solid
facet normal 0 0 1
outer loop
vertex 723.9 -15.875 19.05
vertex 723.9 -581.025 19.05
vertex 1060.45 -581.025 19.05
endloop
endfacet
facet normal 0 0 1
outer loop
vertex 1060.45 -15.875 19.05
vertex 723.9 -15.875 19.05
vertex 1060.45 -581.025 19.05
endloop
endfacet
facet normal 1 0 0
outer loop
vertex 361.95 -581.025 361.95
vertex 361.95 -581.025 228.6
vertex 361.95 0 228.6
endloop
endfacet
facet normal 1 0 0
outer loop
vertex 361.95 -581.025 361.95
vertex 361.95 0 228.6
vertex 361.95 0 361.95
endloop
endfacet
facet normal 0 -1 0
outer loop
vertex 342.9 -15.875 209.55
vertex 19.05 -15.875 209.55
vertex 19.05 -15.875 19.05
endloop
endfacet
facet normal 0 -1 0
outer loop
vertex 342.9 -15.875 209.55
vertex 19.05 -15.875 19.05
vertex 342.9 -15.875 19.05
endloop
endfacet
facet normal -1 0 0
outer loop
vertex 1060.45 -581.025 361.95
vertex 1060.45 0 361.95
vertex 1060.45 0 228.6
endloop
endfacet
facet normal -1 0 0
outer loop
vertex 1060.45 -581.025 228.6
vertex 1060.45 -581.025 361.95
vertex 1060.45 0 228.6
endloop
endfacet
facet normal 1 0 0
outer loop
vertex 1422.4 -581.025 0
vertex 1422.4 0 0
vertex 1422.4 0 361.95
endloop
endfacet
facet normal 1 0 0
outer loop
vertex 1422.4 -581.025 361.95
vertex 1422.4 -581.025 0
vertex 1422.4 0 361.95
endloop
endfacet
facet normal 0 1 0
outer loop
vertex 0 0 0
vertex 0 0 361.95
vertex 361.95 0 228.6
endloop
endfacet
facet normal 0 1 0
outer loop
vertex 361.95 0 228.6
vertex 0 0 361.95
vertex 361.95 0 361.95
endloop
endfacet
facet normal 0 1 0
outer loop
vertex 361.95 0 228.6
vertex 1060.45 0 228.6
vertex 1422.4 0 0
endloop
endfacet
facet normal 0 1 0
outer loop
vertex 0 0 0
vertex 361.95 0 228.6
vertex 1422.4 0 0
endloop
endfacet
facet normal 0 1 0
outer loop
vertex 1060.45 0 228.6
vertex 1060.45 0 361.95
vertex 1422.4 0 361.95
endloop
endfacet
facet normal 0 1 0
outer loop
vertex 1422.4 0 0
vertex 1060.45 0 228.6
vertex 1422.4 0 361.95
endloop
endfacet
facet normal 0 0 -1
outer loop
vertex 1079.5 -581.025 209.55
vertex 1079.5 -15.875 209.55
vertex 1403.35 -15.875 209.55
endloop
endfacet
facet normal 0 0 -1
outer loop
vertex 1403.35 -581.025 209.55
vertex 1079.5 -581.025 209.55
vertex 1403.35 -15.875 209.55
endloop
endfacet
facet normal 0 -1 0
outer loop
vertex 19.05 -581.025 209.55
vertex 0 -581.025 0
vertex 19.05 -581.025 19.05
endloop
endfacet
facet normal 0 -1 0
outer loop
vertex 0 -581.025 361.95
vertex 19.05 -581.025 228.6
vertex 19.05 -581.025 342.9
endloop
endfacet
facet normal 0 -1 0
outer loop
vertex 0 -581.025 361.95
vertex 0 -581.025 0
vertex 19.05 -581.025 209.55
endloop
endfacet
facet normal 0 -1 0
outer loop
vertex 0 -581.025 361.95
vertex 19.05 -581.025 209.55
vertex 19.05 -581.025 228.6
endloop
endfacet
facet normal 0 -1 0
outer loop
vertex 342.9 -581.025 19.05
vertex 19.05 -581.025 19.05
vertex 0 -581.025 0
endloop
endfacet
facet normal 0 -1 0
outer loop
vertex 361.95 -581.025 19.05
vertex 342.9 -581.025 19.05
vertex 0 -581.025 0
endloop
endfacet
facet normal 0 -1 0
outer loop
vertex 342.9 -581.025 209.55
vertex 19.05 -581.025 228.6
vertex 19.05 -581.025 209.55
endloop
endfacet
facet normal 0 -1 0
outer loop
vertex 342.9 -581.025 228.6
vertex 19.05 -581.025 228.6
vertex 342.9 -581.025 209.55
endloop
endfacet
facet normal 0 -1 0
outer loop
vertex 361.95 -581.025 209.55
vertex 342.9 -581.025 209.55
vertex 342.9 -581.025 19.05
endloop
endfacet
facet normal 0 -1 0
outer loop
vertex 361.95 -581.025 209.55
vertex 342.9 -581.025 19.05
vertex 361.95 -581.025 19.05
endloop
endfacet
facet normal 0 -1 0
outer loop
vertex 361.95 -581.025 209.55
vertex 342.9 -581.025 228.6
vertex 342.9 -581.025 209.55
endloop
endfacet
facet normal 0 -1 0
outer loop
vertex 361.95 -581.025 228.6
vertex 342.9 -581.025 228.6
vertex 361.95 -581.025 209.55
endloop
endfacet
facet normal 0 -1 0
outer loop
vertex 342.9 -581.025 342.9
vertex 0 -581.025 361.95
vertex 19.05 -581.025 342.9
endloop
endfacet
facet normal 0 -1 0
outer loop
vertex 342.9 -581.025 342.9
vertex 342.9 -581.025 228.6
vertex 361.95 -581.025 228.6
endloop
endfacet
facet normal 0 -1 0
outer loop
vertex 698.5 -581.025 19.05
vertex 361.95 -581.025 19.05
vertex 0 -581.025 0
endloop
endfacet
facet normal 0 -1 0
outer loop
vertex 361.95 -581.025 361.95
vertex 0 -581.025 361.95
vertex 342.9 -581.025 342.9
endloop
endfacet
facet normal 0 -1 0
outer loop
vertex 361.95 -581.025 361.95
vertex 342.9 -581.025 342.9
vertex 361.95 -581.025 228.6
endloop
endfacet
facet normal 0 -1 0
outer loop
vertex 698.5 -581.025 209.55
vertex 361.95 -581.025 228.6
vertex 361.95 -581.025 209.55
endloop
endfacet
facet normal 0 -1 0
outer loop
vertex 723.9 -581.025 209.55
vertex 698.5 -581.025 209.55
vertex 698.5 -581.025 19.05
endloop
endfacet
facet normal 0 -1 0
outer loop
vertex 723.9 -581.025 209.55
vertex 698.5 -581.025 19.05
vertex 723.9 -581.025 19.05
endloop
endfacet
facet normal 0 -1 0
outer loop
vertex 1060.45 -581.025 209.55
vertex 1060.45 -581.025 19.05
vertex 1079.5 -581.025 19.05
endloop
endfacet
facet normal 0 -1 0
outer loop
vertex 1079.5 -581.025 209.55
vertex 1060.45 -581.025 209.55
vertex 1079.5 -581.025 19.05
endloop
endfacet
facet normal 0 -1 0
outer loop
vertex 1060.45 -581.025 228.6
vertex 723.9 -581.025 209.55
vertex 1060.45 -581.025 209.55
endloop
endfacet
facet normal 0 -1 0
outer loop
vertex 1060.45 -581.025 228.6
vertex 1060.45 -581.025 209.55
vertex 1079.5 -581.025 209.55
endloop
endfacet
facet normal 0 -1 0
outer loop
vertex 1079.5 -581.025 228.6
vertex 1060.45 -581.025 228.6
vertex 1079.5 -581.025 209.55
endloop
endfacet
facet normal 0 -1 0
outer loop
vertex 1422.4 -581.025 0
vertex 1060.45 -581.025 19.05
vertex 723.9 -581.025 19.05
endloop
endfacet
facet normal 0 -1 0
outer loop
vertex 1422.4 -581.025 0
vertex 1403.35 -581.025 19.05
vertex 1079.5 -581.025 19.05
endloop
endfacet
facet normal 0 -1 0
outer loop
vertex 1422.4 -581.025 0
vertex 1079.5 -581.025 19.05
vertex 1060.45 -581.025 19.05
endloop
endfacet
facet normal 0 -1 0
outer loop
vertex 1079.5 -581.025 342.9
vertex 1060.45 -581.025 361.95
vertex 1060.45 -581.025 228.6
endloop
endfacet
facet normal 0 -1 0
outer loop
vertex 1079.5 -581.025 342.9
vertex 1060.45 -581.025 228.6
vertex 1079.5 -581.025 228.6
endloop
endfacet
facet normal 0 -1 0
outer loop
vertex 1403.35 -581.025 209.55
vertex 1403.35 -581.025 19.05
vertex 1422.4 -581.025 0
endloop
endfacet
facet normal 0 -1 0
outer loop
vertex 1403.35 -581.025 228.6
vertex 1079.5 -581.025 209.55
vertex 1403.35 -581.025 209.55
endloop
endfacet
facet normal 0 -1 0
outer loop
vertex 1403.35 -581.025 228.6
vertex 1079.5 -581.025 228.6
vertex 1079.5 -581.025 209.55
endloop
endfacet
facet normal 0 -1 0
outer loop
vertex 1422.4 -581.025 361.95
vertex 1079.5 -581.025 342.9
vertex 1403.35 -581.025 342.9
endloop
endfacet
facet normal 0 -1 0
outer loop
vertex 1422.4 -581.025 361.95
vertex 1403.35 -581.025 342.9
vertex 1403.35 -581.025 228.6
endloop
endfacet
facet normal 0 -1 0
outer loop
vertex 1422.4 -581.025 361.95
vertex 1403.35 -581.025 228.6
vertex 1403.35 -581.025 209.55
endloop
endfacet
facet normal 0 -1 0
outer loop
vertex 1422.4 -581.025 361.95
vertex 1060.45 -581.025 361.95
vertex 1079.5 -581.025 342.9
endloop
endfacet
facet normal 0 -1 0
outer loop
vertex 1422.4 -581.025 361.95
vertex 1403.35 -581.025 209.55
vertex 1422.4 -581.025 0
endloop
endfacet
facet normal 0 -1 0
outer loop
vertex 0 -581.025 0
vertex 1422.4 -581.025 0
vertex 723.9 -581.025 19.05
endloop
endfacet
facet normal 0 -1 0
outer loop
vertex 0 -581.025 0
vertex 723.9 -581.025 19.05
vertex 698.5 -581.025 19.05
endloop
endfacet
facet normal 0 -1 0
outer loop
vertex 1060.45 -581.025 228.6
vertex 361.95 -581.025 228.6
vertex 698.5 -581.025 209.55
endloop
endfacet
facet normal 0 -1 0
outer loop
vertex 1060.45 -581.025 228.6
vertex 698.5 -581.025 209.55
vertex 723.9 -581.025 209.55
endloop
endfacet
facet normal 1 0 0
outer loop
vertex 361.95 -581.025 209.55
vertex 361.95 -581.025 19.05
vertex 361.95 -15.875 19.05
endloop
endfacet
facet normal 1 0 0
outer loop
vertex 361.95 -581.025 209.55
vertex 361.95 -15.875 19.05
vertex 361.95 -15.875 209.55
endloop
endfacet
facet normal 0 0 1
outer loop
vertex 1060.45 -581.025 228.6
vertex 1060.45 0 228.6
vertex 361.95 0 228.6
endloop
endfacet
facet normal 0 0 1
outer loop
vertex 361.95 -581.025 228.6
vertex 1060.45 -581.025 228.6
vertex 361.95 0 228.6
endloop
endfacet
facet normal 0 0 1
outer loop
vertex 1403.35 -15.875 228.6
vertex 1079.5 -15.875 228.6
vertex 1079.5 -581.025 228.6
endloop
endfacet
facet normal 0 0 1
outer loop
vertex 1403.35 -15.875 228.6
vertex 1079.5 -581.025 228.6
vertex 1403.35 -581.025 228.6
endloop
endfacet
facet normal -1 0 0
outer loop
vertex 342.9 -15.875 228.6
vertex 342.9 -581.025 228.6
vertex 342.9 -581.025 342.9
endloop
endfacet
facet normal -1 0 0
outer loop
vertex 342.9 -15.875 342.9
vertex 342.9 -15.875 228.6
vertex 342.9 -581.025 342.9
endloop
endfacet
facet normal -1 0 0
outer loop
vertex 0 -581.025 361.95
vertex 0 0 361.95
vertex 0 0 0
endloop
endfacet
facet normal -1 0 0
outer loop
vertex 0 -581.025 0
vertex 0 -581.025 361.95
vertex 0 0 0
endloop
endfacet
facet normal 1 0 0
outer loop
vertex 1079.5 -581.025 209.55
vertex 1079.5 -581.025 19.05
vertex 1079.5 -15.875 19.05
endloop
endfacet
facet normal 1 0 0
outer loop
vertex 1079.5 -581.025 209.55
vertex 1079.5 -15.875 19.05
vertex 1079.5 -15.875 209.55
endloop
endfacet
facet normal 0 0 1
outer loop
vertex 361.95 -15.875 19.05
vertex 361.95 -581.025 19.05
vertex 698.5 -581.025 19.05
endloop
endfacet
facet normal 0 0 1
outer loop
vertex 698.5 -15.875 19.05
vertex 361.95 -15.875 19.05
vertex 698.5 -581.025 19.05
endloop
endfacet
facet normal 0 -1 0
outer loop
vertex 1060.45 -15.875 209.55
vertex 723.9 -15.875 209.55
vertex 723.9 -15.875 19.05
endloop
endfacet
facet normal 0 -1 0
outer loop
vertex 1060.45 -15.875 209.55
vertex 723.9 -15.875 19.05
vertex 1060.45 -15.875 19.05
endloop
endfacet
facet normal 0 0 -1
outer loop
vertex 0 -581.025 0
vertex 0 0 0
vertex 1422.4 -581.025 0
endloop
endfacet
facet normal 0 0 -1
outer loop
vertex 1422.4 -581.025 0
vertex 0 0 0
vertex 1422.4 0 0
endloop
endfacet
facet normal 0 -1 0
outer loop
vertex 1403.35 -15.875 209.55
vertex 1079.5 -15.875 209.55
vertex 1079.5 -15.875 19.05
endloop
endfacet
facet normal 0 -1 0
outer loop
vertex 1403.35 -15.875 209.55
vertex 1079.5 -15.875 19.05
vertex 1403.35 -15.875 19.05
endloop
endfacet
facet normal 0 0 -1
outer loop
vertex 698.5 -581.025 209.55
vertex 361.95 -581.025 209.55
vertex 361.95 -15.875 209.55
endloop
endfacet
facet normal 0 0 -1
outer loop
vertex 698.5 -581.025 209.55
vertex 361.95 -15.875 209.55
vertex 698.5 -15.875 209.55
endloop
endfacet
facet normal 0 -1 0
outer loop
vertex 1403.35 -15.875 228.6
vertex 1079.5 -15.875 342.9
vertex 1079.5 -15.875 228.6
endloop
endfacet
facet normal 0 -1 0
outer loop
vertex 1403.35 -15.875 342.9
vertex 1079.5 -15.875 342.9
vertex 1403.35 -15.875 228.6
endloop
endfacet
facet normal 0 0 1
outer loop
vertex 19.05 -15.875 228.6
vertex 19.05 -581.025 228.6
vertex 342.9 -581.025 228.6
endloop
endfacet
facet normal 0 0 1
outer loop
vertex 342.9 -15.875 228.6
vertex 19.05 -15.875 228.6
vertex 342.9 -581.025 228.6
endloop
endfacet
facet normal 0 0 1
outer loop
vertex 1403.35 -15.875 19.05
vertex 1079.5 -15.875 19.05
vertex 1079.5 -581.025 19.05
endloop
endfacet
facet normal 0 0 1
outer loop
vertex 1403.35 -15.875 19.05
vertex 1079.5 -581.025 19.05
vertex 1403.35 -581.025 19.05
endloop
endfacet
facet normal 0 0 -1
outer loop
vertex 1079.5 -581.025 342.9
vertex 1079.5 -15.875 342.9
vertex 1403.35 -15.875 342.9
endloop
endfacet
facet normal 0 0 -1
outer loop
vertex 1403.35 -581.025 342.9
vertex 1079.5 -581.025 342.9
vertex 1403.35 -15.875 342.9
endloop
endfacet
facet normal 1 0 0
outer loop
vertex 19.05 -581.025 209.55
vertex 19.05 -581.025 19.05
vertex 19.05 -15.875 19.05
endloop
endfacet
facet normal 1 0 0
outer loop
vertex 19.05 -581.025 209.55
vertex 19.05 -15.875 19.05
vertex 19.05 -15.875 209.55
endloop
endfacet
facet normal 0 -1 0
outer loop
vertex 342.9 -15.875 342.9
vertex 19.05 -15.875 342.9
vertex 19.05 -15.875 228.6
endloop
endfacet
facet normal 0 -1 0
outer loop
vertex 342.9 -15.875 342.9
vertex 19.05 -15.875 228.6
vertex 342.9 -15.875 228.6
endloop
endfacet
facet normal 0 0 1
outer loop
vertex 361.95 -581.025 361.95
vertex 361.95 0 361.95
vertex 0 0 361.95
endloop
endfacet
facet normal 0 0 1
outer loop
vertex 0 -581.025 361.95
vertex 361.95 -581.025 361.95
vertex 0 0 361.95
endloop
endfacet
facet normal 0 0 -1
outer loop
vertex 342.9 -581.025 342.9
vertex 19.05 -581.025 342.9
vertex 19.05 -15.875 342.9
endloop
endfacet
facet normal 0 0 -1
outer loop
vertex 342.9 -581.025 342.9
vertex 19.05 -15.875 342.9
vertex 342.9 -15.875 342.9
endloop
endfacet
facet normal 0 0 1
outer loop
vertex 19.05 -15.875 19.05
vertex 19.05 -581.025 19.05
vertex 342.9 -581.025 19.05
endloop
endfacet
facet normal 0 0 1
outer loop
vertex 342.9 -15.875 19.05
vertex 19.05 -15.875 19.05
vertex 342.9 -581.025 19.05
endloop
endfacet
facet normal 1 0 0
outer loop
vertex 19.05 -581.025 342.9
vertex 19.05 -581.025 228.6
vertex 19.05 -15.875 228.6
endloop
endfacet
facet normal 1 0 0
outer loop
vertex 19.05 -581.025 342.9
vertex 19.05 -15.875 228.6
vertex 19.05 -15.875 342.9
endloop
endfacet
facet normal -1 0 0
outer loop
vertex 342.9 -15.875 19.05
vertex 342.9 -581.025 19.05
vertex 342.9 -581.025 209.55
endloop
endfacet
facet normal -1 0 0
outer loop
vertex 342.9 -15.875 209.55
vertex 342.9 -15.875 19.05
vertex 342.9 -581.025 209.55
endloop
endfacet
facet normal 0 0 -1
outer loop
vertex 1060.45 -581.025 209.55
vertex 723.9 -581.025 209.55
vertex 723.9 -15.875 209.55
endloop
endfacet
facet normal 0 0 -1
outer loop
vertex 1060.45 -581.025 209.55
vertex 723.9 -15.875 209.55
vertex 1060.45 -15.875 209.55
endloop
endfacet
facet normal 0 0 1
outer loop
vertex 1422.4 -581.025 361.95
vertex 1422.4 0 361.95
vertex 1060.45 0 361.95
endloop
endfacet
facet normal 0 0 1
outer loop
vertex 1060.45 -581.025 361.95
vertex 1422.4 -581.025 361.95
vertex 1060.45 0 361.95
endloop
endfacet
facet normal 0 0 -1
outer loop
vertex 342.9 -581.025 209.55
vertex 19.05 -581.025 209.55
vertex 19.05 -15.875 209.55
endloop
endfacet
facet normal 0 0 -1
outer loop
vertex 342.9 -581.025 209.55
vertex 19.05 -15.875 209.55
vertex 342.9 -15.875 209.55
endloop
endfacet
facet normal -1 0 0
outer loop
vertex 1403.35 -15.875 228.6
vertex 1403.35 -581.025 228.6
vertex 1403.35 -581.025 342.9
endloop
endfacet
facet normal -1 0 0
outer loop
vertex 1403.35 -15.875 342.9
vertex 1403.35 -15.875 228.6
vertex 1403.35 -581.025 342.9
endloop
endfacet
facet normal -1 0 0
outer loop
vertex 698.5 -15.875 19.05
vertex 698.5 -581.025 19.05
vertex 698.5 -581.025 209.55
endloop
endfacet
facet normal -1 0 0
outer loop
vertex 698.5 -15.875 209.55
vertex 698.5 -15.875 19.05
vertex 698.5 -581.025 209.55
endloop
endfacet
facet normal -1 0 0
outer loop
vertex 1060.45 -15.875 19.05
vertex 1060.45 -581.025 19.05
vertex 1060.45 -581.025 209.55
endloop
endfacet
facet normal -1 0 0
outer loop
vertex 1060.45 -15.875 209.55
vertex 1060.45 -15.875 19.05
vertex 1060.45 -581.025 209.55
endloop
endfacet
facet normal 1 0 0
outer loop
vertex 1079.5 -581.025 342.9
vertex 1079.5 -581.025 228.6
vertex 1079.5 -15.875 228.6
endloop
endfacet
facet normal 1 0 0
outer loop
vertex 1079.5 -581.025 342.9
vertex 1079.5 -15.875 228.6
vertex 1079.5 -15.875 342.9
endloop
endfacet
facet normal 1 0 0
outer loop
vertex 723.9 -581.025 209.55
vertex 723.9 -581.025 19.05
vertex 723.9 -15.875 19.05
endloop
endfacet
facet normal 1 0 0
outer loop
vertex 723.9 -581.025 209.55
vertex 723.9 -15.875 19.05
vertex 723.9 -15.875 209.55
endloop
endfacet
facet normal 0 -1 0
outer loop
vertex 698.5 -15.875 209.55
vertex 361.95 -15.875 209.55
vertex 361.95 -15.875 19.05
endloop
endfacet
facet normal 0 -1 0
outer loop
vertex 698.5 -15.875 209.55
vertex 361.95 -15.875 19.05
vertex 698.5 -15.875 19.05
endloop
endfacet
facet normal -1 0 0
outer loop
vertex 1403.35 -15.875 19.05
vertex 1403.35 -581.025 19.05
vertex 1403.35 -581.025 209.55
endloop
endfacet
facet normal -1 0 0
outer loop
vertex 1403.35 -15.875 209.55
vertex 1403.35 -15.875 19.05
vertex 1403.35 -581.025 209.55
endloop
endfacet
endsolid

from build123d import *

# Parameters (mm, degrees)
F1_DEPTH = 581.025
F2_W     = 323.85
F2_H     = 114.3
F2_H_2   = 190.5
F2_W_2   = 336.55
F3_DEPTH = 565.15


with BuildPart() as f1:
    # F0 (on Front) → F1 (new body)
    with BuildSketch(Plane.XZ):
        Polygon((0, 361.95), (0, 0), (1422.4, 0), (1422.4, 361.95), (1060.45, 361.95), (1060.45, 228.6), (361.95, 228.6), (361.95, 361.95), align=None)
    extrude(amount=F1_DEPTH)

    # F2 (on face) → F3 (cut)
    with BuildSketch(Plane.XZ.offset(581.025)):
        with Locations((180.975, 285.75)):
            Rectangle(F2_W, F2_H)
        with Locations((180.975, 114.3)):
            Rectangle(F2_W, F2_H_2)
        with Locations((530.225, 114.3)):
            Rectangle(F2_W_2, F2_H_2)
        with Locations((892.175, 114.3)):
            Rectangle(F2_W_2, F2_H_2)
        with Locations((1241.425, 114.3)):
            Rectangle(F2_W, F2_H_2)
        with Locations((1241.425, 285.75)):
            Rectangle(F2_W, F2_H)
    extrude(amount=-F3_DEPTH, mode=Mode.SUBTRACT)


solid = f1.part
